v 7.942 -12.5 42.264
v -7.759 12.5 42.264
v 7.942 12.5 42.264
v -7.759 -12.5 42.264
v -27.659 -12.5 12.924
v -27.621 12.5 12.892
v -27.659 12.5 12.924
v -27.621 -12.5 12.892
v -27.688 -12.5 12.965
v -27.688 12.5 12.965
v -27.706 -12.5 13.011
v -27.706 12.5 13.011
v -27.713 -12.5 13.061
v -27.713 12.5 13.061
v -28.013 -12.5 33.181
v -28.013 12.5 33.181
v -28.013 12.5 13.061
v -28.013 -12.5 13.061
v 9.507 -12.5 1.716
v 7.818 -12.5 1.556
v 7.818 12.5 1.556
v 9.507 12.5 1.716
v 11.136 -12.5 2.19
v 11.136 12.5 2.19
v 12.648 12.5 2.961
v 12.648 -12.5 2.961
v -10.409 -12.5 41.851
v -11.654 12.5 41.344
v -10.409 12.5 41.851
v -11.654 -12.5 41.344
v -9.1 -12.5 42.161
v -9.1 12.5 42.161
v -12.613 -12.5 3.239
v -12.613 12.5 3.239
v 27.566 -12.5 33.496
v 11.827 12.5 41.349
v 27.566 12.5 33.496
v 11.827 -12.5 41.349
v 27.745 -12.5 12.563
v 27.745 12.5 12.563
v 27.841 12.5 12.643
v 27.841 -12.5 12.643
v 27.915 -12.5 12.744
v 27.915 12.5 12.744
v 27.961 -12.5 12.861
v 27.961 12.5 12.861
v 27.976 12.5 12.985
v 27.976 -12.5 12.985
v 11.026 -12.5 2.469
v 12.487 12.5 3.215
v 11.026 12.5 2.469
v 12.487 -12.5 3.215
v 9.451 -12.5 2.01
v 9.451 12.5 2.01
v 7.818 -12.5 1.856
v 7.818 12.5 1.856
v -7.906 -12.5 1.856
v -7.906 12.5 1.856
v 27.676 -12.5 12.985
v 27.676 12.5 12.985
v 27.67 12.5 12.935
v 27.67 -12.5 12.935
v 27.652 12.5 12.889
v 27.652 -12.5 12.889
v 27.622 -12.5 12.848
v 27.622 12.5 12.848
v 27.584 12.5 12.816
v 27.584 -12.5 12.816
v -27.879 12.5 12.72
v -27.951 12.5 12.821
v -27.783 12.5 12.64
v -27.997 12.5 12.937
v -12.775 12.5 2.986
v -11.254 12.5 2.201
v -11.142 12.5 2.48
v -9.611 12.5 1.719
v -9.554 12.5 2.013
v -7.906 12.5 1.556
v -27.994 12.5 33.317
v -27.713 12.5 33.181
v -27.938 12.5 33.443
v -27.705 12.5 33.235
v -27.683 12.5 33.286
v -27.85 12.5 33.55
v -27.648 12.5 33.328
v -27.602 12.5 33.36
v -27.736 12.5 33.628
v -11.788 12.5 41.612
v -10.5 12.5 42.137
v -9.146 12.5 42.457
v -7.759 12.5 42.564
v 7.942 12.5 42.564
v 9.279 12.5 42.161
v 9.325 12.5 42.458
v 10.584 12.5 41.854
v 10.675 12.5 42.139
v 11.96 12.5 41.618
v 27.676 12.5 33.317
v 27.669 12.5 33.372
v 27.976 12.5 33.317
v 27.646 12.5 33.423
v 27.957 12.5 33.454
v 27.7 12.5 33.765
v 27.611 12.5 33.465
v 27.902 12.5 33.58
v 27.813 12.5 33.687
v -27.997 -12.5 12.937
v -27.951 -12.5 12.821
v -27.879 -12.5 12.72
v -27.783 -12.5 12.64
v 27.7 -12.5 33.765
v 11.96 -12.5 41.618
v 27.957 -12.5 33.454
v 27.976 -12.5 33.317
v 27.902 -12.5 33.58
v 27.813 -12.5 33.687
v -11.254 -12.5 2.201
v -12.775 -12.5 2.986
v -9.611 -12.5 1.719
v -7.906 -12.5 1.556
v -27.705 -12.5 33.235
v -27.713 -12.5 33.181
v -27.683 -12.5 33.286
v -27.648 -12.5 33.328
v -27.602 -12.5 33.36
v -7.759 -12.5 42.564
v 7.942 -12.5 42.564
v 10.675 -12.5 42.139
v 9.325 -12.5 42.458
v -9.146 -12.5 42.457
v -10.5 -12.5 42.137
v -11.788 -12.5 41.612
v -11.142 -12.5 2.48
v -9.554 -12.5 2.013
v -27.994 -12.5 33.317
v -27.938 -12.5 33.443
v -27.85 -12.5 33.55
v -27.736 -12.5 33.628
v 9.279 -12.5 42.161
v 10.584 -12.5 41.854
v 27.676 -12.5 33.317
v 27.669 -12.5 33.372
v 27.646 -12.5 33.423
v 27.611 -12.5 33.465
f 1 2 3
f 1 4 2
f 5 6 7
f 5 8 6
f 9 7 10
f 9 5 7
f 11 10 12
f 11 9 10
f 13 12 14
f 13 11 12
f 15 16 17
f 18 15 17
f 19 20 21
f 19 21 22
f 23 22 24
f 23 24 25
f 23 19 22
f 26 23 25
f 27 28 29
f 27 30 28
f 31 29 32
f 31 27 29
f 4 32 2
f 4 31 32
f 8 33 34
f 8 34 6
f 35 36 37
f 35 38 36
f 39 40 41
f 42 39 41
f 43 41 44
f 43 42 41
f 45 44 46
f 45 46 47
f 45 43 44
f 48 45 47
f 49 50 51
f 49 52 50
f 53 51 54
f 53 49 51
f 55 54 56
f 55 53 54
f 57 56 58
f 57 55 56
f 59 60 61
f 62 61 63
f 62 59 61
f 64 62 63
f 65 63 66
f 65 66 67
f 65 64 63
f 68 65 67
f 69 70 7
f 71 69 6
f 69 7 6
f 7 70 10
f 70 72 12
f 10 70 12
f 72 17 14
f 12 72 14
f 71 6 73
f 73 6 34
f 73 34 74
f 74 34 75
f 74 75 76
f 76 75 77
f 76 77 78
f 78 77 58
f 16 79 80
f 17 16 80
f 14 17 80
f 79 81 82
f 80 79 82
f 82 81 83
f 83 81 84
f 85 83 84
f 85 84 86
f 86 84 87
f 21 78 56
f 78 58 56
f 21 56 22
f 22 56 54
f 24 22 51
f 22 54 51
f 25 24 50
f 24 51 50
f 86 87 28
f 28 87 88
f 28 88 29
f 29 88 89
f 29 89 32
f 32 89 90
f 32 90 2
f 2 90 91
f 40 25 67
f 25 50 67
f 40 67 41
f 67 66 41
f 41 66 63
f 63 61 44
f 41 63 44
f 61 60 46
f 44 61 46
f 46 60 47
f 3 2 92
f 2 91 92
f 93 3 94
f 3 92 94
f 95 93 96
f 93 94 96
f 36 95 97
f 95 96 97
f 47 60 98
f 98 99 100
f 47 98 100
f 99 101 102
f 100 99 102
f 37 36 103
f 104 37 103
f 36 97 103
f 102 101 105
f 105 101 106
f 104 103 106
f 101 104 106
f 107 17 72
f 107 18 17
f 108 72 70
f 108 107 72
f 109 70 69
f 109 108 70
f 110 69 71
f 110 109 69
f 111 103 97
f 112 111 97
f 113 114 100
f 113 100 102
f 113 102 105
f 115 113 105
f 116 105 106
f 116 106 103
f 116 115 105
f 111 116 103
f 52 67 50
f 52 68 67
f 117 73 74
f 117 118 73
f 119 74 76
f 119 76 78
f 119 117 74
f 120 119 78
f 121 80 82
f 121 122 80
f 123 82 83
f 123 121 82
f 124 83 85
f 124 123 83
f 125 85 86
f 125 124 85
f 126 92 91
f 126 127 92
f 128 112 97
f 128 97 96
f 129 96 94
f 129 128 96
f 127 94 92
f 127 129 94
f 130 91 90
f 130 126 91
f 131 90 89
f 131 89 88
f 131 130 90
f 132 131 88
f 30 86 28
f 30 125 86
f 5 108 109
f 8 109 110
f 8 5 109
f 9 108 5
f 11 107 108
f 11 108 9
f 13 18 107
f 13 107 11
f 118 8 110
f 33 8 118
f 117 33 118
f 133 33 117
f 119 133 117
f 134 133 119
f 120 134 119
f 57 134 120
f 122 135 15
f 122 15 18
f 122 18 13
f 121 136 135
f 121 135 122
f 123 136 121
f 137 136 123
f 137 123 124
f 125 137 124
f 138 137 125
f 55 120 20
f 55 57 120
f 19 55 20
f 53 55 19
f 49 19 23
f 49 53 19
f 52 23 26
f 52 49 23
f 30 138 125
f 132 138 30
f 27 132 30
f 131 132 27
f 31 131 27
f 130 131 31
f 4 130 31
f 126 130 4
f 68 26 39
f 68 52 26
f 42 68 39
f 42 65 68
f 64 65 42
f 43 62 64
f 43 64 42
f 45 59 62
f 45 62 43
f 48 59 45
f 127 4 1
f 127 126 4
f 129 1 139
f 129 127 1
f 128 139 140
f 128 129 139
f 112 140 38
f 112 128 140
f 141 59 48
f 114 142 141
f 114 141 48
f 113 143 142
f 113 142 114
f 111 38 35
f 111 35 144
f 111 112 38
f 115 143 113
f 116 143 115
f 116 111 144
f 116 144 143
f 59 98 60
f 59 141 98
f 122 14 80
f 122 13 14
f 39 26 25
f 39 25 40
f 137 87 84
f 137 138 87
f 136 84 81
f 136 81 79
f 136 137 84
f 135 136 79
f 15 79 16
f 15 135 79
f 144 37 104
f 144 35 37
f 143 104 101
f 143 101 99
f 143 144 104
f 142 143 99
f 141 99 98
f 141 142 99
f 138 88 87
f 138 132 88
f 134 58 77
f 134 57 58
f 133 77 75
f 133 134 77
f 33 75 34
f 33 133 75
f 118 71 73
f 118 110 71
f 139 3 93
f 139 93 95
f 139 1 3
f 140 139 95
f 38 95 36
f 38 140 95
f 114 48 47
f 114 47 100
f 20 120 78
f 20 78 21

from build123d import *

# Parameters (mm, degrees)
F1_DEPTH = 12.5


with BuildPart() as f1:
    # F0 (on Front) → F1 (new body, symmetric)
    with BuildSketch(Plane.XZ):
        with BuildLine():
            ThreePointArc((-12.775239, 2.986369), (-10.443709, 1.920714), (-7.906317, 1.555622))
            Line((-7.906317, 1.555622), (7.817851, 1.555622))
            ThreePointArc((7.817851, 1.555622), (10.332984, 1.914204), (12.647699, 2.961377))
            Line((12.647699, 2.961377), (27.744712, 12.562894))
            ThreePointArc((27.744712, 12.562894), (27.914658, 12.744133), (27.976387, 12.984796))
            Line((27.976387, 12.984796), (27.976387, 33.317433))
            ThreePointArc((27.976387, 33.317433), (27.901601, 33.580479), (27.699614, 33.764836))
            Line((27.699614, 33.764836), (11.960489, 41.6177))
            ThreePointArc((11.960489, 41.6177), (10.006461, 42.324558), (7.942404, 42.56444))
            Line((7.942404, 42.56444), (-7.7593, 42.56444))
            ThreePointArc((-7.7593, 42.56444), (-9.829371, 42.323139), (-11.78844, 41.612175))
            Line((-11.78844, 41.612175), (-27.736375, 33.627757))
            ThreePointArc((-27.736375, 33.627757), (-27.937928, 33.443415), (-28.012534, 33.180661))
            Line((-28.012534, 33.180661), (-28.012534, 13.060643))
            ThreePointArc((-28.012534, 13.060643), (-27.951423, 12.82111), (-27.783029, 12.640129))
            Line((-27.783029, 12.640129), (-12.775239, 2.986369))
        make_face()
        with BuildLine():
            Line((-12.612941, 3.238677), (-27.620732, 12.892438))
            ThreePointArc((-27.620732, 12.892438), (-27.688089, 12.96483), (-27.712534, 13.060643))
            Line((-27.712534, 13.060643), (-27.712534, 33.180661))
            ThreePointArc((-27.712534, 33.180661), (-27.682691, 33.285763), (-27.60207, 33.3595))
            Line((-27.60207, 33.3595), (-11.654136, 41.343917))
            ThreePointArc((-11.654136, 41.343917), (-9.760369, 42.031183), (-7.7593, 42.26444))
            Line((-7.7593, 42.26444), (7.942404, 42.26444))
            ThreePointArc((7.942404, 42.26444), (9.937659, 42.032554), (11.826553, 41.349258))
            Line((11.826553, 41.349258), (27.565678, 33.496394))
            ThreePointArc((27.565678, 33.496394), (27.646473, 33.422652), (27.676387, 33.317433))
            Line((27.676387, 33.317433), (27.676387, 12.984796))
            ThreePointArc((27.676387, 12.984796), (27.651695, 12.888531), (27.583717, 12.816035))
            Line((27.583717, 12.816035), (12.486704, 3.214518))
            ThreePointArc((12.486704, 3.214518), (10.249146, 2.202252), (7.817851, 1.855622))
            Line((7.817851, 1.855622), (-7.906317, 1.855622))
            ThreePointArc((-7.906317, 1.855622), (-10.359129, 2.208544), (-12.612941, 3.238677))
        make_face(mode=Mode.SUBTRACT)
    extrude(amount=F1_DEPTH, both=True)


solid = f1.part
